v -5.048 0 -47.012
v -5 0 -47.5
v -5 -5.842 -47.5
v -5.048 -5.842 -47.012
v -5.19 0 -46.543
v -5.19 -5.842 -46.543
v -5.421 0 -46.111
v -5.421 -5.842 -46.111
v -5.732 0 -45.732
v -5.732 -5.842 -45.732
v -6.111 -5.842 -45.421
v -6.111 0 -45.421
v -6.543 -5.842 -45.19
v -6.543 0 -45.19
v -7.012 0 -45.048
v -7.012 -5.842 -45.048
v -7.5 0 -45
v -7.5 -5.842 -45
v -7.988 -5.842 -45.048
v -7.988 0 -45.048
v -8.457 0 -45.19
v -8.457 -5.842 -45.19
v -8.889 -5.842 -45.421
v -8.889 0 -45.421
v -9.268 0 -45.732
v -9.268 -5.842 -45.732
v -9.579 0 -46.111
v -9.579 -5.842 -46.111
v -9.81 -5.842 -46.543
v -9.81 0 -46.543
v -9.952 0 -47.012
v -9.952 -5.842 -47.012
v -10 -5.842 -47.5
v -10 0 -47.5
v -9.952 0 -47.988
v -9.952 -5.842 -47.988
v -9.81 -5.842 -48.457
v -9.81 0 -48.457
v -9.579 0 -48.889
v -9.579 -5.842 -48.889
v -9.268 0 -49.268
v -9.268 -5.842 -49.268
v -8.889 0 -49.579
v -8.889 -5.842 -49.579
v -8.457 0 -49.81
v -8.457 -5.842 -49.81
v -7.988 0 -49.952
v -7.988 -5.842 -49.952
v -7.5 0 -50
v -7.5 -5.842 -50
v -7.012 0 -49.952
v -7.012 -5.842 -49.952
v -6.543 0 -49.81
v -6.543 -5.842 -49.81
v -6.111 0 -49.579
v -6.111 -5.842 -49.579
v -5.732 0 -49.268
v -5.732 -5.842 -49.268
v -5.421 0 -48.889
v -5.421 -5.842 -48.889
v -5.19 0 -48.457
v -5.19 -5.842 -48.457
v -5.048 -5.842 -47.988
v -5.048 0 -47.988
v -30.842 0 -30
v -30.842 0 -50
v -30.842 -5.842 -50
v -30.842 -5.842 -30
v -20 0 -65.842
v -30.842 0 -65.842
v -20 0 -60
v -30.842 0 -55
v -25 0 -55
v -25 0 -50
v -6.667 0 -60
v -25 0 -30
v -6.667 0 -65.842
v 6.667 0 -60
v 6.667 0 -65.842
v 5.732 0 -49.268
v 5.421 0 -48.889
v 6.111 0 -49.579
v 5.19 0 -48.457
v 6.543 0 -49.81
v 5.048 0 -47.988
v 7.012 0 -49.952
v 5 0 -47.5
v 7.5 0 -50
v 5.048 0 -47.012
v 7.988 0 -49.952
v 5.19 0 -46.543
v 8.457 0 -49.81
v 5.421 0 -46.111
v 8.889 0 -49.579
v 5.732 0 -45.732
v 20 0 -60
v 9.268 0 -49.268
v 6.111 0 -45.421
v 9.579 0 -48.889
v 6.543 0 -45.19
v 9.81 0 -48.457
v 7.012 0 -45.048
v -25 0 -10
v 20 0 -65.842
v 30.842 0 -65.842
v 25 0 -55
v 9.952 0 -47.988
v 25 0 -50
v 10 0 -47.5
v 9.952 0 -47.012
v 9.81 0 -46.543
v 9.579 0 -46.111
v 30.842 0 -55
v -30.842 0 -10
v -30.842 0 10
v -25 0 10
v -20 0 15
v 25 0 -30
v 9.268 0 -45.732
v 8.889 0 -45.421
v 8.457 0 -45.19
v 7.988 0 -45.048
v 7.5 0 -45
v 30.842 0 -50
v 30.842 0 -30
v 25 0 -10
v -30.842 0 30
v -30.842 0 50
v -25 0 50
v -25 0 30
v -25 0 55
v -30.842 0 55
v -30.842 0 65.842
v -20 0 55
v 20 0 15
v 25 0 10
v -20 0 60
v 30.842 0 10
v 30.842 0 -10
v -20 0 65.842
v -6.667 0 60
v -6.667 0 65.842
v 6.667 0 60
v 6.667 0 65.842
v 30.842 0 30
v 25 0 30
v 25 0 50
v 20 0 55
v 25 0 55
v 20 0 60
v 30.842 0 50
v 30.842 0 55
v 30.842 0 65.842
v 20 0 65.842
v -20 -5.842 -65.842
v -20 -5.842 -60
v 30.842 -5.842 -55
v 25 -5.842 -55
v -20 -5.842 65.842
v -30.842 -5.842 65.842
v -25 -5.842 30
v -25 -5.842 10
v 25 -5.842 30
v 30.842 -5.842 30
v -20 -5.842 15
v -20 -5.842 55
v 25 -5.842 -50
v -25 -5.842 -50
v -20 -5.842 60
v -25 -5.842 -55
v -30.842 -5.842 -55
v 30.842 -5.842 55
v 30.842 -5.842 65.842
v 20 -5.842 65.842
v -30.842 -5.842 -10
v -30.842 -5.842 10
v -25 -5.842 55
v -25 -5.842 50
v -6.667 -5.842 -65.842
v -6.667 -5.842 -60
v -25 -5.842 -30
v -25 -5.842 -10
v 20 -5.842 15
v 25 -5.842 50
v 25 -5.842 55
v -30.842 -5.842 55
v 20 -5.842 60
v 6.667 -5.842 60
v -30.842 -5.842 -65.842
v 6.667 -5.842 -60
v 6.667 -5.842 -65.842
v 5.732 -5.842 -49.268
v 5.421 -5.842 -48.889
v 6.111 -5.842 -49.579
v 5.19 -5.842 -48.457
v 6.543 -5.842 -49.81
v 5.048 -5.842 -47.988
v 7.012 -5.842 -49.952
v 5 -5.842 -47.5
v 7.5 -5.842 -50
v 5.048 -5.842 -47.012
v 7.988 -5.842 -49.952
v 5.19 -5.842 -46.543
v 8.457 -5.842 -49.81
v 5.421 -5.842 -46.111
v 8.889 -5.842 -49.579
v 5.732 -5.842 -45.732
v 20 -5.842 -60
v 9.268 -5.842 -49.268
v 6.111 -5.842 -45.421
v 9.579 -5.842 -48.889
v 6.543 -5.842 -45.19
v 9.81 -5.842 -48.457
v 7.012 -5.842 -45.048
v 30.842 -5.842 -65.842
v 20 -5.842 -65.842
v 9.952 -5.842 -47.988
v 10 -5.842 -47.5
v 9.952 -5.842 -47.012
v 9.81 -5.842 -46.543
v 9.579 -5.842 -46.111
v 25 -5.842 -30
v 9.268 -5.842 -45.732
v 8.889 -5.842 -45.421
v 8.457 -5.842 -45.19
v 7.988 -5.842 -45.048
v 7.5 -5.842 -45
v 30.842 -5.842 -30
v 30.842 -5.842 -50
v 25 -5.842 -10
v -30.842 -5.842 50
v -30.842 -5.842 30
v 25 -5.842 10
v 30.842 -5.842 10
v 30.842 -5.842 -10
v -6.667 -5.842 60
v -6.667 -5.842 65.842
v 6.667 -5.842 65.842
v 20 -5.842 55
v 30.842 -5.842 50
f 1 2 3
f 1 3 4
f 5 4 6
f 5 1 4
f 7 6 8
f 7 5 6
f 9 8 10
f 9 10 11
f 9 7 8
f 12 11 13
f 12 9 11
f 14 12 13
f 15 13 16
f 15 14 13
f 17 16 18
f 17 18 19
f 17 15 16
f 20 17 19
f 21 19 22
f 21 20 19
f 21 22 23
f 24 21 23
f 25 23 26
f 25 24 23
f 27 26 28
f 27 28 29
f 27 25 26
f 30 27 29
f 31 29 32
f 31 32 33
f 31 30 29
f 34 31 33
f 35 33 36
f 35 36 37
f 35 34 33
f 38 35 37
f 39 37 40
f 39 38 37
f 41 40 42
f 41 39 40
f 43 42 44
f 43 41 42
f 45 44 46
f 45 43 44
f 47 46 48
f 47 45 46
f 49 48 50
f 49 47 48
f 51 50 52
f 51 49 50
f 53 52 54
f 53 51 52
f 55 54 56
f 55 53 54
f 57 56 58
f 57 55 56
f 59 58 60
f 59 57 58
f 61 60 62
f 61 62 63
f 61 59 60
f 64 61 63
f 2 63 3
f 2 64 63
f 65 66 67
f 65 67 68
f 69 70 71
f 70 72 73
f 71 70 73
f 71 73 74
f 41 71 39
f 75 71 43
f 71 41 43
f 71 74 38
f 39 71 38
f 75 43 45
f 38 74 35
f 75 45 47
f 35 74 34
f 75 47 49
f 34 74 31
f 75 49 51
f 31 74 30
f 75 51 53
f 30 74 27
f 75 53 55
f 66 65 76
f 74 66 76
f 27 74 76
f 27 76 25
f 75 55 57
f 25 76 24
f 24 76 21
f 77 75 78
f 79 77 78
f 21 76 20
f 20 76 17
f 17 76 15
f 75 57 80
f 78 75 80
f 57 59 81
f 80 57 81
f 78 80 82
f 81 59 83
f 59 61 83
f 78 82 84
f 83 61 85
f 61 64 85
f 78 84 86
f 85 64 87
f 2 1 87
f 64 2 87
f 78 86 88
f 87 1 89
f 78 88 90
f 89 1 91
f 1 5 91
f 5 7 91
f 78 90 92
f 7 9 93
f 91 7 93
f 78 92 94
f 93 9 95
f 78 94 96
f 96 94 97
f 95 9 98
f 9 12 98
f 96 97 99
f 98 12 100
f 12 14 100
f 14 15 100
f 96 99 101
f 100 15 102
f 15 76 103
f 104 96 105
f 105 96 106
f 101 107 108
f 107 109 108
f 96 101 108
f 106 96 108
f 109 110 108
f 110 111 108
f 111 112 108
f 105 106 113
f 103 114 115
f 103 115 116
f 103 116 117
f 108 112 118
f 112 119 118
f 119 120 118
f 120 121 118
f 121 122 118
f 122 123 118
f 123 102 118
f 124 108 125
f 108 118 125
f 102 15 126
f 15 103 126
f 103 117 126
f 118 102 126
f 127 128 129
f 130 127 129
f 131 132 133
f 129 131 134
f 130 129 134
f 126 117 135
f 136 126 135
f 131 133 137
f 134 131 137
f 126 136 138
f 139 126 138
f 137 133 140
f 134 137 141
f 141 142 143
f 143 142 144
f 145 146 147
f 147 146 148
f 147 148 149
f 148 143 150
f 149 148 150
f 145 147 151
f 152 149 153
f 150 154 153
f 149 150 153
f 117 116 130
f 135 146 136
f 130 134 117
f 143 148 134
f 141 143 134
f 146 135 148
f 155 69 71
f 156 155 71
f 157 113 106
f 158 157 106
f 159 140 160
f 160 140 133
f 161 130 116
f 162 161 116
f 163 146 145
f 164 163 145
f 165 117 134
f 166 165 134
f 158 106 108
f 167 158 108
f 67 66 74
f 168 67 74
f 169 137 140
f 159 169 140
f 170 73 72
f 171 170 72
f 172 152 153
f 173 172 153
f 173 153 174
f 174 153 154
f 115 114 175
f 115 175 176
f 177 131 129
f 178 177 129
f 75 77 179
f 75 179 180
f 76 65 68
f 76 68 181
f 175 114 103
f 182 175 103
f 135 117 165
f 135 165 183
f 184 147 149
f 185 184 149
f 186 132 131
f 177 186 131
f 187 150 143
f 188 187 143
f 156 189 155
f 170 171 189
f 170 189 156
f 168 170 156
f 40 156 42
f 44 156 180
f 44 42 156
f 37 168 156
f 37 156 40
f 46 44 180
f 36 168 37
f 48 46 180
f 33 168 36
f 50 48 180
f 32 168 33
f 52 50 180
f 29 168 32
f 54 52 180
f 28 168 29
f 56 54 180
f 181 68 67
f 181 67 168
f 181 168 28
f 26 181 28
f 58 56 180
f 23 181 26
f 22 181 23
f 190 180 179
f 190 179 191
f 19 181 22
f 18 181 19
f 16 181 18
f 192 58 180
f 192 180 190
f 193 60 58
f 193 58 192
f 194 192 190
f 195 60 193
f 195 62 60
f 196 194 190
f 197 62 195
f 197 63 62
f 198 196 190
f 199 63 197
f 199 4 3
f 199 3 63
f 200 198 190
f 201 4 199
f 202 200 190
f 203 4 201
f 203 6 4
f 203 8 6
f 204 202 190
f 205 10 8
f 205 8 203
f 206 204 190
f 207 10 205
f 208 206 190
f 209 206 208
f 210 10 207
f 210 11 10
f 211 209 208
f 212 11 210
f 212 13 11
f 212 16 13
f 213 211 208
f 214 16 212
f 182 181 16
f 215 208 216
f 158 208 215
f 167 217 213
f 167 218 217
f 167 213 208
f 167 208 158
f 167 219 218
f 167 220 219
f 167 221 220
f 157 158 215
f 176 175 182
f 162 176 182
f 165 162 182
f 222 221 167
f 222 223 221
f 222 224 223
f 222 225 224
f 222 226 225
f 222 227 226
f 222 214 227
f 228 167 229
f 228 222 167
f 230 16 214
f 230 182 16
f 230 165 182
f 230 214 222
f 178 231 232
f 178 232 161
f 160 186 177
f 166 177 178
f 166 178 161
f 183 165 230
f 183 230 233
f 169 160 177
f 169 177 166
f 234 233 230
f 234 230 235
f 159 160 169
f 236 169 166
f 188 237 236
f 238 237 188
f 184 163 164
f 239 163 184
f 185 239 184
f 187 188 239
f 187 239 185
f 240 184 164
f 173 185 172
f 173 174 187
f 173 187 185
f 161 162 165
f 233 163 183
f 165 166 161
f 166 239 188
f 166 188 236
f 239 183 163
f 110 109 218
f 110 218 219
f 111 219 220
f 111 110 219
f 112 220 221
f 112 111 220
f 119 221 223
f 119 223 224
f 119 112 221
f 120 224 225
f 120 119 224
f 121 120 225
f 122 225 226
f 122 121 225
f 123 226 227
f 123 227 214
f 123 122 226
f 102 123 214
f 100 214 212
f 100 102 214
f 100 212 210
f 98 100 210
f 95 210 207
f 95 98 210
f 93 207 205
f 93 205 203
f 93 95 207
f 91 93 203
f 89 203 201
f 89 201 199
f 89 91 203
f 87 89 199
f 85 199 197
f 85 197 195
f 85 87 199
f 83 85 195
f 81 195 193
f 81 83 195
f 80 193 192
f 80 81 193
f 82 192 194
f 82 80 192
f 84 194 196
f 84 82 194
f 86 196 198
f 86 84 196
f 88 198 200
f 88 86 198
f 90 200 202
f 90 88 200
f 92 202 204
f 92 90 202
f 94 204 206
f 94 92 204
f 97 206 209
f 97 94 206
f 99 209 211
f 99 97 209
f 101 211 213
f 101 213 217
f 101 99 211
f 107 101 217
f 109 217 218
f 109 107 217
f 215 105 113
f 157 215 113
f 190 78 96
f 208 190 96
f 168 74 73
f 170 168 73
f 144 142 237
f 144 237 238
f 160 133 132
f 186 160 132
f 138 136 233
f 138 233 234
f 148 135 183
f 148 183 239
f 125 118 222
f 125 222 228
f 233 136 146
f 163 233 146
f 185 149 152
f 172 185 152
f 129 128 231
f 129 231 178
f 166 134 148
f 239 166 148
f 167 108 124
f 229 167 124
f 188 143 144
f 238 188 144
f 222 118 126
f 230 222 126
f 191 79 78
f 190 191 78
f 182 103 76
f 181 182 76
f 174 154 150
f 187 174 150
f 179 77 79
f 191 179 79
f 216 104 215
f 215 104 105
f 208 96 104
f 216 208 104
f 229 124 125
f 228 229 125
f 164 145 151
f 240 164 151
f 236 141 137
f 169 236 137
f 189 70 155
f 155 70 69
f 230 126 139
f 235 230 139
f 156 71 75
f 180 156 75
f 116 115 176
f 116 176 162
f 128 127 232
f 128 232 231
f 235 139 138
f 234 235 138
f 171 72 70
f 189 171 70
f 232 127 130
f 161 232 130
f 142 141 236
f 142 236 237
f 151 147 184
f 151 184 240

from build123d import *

# Parameters (mm, degrees)
F0_R     = 2.5
F0_W     = 40
F0_H     = 40
F0_W_2   = 13.333334
F0_H_2   = 5.842
F0_W_3   = 5.842
F0_H_3   = 20
F1_DEPTH = 5.842


with BuildPart() as f1:
    # F0 (on Front) → F1 (new body)
    with BuildSketch(Plane.XZ):
        Polygon((-25, 55), (-25, 60), (-20, 60), (-20, 65.842), (-30.842, 65.842), (-30.842, 55), align=None)
        Polygon((-20, 60), (-25, 60), (-25, 55), (-25, 50), (-25, 30), (-25, 10), (-25, -10), (-25, -30), (-25, -50), (-25, -55), (-25, -60), (-20, -60), (-6.666667, -60), (6.666667, -60), (20, -60), (25, -60), (25, -55), (25, -50), (25, -30), (25, -10), (25, 10), (25, 30), (25, 50), (25, 55), (25, 60), (20, 60), (6.666667, 60), (-6.666667, 60), align=None)
        with Locations((-7.5, -47.5)):
            Circle(F0_R, mode=Mode.SUBTRACT)
        with Locations((7.5, -47.5)):
            Circle(F0_R, mode=Mode.SUBTRACT)
        with Locations((0, 35)):
            Rectangle(F0_W, F0_H, mode=Mode.SUBTRACT)
        with Locations((0, 62.921)):
            Rectangle(F0_W_2, F0_H_2)
        with Locations((-27.921, 40)):
            Rectangle(F0_W_3, F0_H_3)
        Polygon((20, 65.842), (20, 60), (25, 60), (25, 55), (30.842, 55), (30.842, 65.842), align=None)
        with Locations((-27.921, 0)):
            Rectangle(F0_W_3, F0_H_3)
        with Locations((-27.921, -40)):
            Rectangle(F0_W_3, F0_H_3)
        with Locations((27.921, 40)):
            Rectangle(F0_W_3, F0_H_3)
        Polygon((-25, -60), (-25, -55), (-30.842, -55), (-30.842, -65.842), (-20, -65.842), (-20, -60), align=None)
        with Locations((27.921, 0)):
            Rectangle(F0_W_3, F0_H_3)
        with Locations((27.921, -40)):
            Rectangle(F0_W_3, F0_H_3)
        with Locations((0, -62.921)):
            Rectangle(F0_W_2, F0_H_2)
        Polygon((30.842, -55), (25, -55), (25, -60), (20, -60), (20, -65.842), (30.842, -65.842), align=None)
    extrude(amount=F1_DEPTH)


solid = f1.part
